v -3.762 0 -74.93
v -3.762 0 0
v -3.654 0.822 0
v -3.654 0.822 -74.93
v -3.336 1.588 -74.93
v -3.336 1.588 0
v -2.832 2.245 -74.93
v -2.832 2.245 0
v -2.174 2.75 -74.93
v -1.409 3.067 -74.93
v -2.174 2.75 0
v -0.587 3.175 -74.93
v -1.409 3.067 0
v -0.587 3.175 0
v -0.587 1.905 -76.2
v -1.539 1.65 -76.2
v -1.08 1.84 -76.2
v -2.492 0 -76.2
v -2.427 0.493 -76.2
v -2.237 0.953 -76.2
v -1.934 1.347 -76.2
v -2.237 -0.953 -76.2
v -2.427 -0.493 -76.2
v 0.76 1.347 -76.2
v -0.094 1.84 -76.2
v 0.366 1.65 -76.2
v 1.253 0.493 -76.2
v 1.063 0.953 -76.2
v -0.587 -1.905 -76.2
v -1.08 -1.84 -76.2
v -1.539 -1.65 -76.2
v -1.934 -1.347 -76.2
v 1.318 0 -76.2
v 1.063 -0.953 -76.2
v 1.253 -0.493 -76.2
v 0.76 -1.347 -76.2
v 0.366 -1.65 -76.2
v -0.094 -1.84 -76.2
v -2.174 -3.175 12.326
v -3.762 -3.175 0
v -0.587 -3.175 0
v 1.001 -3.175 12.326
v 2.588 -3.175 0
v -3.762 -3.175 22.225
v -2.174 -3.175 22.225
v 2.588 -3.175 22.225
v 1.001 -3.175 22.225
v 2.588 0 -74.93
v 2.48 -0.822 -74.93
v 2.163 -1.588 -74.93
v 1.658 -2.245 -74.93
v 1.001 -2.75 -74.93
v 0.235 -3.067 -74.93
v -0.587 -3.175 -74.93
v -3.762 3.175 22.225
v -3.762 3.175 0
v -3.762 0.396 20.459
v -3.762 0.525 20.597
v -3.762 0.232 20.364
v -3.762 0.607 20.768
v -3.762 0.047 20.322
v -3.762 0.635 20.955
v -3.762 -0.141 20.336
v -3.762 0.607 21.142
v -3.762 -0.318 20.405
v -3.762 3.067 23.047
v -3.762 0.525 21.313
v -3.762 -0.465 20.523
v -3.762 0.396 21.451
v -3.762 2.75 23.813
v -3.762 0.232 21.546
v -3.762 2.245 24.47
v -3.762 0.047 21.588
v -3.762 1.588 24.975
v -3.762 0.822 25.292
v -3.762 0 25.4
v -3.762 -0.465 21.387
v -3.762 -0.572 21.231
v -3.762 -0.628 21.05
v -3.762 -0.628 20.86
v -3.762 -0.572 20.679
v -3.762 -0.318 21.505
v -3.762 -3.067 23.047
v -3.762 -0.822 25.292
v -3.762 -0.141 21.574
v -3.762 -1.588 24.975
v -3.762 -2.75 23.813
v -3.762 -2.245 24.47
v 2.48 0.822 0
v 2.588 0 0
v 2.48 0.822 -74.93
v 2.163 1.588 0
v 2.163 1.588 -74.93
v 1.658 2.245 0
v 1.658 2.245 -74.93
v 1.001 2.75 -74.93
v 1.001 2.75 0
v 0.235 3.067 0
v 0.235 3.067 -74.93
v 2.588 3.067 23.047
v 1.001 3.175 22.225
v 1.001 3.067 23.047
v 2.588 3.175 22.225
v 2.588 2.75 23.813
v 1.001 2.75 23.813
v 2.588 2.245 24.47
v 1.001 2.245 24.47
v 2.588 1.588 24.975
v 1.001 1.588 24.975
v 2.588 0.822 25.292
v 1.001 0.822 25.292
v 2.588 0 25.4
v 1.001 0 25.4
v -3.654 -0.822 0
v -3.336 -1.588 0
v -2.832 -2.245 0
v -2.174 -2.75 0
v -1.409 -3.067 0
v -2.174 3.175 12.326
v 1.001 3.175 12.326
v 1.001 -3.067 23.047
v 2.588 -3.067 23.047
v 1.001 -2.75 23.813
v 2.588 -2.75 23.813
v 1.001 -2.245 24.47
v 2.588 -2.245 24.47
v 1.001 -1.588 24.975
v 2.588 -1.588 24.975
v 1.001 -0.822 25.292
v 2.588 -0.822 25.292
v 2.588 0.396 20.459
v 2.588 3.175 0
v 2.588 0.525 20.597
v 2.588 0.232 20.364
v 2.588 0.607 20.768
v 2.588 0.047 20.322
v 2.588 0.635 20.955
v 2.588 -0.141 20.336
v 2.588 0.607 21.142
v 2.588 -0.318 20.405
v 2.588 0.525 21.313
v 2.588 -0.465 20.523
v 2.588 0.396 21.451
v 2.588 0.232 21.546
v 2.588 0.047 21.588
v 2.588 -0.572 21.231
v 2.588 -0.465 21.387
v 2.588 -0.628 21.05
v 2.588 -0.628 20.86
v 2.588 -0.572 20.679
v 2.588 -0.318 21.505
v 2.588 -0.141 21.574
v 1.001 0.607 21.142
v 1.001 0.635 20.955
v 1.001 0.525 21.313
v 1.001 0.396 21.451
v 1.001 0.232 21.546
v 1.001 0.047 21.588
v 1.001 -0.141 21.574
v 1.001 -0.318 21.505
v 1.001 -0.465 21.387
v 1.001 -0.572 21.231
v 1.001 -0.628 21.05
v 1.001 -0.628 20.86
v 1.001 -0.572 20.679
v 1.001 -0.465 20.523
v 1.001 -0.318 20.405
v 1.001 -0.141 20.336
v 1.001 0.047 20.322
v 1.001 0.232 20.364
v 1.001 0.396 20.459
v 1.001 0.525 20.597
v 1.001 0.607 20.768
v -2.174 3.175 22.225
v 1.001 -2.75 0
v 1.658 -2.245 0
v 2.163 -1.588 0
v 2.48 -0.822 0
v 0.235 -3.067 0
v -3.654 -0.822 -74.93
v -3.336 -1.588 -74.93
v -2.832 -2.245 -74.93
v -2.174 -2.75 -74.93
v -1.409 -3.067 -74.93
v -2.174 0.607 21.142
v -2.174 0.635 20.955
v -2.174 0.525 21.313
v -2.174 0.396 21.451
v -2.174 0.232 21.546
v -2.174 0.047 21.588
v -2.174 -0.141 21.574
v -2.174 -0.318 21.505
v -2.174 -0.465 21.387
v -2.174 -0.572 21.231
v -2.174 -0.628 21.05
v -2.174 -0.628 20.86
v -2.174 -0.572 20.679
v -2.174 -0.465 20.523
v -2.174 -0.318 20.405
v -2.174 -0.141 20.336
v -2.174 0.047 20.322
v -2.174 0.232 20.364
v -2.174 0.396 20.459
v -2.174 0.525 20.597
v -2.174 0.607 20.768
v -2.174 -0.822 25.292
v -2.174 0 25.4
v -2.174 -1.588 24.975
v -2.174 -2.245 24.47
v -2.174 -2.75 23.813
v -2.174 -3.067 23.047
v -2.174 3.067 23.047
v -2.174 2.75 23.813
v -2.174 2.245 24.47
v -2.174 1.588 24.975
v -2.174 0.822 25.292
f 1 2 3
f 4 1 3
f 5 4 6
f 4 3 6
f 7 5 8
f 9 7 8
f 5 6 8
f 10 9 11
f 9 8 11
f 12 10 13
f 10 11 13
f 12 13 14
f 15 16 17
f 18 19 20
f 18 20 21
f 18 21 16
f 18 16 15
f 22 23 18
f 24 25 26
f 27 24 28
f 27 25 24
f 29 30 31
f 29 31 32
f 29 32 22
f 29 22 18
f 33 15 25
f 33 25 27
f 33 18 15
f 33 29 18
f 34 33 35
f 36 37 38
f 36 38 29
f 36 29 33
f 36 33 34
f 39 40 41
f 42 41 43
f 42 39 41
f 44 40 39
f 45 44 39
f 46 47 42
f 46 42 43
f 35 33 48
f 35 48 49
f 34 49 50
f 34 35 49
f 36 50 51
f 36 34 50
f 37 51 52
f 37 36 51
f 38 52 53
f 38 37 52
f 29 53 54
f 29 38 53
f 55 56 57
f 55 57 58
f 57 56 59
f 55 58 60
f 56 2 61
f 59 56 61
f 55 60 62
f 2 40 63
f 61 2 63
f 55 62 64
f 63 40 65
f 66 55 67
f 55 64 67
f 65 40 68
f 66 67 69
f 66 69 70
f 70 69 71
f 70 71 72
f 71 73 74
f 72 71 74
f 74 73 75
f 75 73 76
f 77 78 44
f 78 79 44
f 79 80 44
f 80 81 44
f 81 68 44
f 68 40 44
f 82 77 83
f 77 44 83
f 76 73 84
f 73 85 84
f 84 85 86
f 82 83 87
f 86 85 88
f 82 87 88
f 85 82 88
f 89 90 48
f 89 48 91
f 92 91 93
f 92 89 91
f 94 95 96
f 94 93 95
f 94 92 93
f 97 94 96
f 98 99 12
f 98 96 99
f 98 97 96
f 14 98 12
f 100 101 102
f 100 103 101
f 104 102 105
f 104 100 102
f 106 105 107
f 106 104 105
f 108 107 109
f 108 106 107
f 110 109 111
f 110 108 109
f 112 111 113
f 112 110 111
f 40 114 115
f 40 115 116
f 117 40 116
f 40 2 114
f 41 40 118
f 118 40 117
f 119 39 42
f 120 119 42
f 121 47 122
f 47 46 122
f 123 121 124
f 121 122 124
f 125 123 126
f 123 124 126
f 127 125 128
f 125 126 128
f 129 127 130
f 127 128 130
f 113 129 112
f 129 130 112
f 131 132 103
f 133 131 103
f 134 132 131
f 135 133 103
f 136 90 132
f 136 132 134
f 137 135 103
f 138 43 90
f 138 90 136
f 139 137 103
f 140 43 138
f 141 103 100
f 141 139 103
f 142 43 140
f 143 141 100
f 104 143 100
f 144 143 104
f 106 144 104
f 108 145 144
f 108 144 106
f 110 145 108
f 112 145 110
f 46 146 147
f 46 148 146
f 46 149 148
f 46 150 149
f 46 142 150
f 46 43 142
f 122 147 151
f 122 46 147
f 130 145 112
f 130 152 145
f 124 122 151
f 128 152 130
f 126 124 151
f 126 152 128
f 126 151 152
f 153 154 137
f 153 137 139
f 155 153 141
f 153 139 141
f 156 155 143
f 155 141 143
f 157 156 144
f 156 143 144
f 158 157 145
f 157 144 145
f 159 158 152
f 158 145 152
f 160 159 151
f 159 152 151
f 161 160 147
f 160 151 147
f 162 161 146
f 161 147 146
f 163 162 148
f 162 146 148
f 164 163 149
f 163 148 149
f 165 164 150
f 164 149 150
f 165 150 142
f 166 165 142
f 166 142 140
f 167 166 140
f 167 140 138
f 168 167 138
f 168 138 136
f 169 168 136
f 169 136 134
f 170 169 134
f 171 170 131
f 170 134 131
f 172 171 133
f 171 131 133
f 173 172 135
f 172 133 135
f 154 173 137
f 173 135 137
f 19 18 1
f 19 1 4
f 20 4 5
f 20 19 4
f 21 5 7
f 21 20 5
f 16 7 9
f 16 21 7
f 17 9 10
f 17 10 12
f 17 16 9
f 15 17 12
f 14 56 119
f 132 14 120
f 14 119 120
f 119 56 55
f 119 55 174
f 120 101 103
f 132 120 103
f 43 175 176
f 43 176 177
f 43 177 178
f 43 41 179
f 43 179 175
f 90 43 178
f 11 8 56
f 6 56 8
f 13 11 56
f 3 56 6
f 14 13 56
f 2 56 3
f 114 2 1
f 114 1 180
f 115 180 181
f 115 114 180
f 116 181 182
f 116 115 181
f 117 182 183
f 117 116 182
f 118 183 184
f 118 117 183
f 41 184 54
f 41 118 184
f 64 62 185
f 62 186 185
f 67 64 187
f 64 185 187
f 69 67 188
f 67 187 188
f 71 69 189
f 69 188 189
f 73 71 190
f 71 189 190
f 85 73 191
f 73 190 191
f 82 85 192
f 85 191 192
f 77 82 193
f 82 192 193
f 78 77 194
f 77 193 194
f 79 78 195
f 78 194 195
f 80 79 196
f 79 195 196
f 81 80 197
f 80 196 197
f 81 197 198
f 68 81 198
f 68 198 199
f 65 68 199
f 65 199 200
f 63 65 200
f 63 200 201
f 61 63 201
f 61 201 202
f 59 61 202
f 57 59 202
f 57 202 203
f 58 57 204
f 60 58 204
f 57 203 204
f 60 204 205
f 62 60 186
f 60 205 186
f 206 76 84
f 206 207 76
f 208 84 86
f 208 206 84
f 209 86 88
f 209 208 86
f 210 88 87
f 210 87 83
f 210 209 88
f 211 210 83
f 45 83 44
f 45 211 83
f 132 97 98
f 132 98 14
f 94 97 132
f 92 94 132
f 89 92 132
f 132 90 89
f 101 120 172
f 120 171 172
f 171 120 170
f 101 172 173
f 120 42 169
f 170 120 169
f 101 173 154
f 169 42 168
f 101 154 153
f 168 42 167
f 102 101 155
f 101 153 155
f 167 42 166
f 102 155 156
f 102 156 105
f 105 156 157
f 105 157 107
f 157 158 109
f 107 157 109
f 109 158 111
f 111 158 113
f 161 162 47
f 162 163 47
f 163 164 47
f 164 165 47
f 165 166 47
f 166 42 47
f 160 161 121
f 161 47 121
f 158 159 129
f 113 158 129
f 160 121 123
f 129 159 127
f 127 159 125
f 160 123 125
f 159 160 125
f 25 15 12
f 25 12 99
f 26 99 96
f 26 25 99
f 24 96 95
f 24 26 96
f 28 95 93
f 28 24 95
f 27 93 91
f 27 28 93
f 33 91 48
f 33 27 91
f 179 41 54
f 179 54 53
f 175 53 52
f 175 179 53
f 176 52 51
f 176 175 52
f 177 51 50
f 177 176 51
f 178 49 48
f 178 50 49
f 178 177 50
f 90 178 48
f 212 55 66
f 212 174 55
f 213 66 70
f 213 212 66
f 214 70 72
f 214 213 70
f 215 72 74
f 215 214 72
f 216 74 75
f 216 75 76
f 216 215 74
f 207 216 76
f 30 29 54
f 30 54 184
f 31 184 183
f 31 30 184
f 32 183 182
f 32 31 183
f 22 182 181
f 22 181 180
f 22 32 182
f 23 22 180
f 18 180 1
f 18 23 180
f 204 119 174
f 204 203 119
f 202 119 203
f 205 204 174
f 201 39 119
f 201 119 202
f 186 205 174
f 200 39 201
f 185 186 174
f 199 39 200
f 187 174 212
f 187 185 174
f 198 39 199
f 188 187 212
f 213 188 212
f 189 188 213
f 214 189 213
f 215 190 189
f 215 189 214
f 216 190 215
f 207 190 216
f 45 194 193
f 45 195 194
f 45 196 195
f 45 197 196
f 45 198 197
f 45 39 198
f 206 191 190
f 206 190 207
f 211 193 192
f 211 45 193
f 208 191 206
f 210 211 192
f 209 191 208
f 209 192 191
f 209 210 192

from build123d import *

# Parameters (mm, degrees)
F0_W     = 6.35
F0_H     = 76.2
F1_DEPTH = 3.175
F2_R     = 3.17499
F3_W     = 6.35
F3_H     = 25.4
F5_DEPTH = 3.175
F4_W     = 3.175
F4_H     = 13.0743015936
F6_DEPTH = 5.08
F7_R     = 0.635
F8_DEPTH = 3.81
F9_R     = 3.17499
F10_SIZE = 1.27


# Not quite as in the source:
# - a fillet or chamfer is up to 0.001 mm smaller than in the source, because OpenCascade refuses the exact size


with BuildPart() as f1:
    # F0 (on Front) → F1 (new body, symmetric)
    with BuildSketch(Plane.XZ):
        with Locations((-0.5868453211, -38.1)):
            Rectangle(F0_W, F0_H)
    extrude(amount=F1_DEPTH, both=True)

    # F2 (radius 3.175 in the source; OpenCascade refuses exactly that, so slightly less here)
    f2_edges = [f1.edges().sort_by_distance(p)[0] for p in [
        (2.588155, -3.175, -38.1),
        (2.588155, 3.175, -38.1),
        (-3.761845, -3.175, -38.1),
        (-3.761845, 3.175, -38.1),
    ]]
    fillet(f2_edges, radius=F2_R)

    # F3 (on Front) → F5 (join, symmetric)
    with BuildSketch(Plane.XZ):
        with Locations((-0.5868453211, 12.7)):
            Rectangle(F3_W, F3_H)
    extrude(amount=F5_DEPTH, both=True)

    # F4 (on Front) → F6 (cut, symmetric)
    with BuildSketch(Plane.XZ):
        with Locations((-0.5868453211, 18.8628492032)):
            Rectangle(F4_W, F4_H)
    extrude(amount=F6_DEPTH, both=True, mode=Mode.SUBTRACT)

    # F7 (on Right) → F8 (cut, symmetric)
    with BuildSketch(Plane.YZ):
        with Locations((0, 20.955)):
            Circle(F7_R)
    extrude(amount=F8_DEPTH, both=True, mode=Mode.SUBTRACT)

    # F9 (radius 3.175 in the source; OpenCascade refuses exactly that, so slightly less here)
    f9_edges = [f1.edges().sort_by_distance(p)[0] for p in [
        (-2.968095, -3.175, 25.4),
        (1.794405, -3.175, 25.4),
        (1.794405, 3.175, 25.4),
        (-2.968095, 3.175, 25.4),
    ]]
    fillet(f9_edges, radius=F9_R)

    # F10
    f10_edges = [f1.edges().sort_by_distance(p)[0] for p in [
        (-2.831912, 2.245067, -76.2),
    ]]
    chamfer(f10_edges, length=F10_SIZE)


solid = f1.part
